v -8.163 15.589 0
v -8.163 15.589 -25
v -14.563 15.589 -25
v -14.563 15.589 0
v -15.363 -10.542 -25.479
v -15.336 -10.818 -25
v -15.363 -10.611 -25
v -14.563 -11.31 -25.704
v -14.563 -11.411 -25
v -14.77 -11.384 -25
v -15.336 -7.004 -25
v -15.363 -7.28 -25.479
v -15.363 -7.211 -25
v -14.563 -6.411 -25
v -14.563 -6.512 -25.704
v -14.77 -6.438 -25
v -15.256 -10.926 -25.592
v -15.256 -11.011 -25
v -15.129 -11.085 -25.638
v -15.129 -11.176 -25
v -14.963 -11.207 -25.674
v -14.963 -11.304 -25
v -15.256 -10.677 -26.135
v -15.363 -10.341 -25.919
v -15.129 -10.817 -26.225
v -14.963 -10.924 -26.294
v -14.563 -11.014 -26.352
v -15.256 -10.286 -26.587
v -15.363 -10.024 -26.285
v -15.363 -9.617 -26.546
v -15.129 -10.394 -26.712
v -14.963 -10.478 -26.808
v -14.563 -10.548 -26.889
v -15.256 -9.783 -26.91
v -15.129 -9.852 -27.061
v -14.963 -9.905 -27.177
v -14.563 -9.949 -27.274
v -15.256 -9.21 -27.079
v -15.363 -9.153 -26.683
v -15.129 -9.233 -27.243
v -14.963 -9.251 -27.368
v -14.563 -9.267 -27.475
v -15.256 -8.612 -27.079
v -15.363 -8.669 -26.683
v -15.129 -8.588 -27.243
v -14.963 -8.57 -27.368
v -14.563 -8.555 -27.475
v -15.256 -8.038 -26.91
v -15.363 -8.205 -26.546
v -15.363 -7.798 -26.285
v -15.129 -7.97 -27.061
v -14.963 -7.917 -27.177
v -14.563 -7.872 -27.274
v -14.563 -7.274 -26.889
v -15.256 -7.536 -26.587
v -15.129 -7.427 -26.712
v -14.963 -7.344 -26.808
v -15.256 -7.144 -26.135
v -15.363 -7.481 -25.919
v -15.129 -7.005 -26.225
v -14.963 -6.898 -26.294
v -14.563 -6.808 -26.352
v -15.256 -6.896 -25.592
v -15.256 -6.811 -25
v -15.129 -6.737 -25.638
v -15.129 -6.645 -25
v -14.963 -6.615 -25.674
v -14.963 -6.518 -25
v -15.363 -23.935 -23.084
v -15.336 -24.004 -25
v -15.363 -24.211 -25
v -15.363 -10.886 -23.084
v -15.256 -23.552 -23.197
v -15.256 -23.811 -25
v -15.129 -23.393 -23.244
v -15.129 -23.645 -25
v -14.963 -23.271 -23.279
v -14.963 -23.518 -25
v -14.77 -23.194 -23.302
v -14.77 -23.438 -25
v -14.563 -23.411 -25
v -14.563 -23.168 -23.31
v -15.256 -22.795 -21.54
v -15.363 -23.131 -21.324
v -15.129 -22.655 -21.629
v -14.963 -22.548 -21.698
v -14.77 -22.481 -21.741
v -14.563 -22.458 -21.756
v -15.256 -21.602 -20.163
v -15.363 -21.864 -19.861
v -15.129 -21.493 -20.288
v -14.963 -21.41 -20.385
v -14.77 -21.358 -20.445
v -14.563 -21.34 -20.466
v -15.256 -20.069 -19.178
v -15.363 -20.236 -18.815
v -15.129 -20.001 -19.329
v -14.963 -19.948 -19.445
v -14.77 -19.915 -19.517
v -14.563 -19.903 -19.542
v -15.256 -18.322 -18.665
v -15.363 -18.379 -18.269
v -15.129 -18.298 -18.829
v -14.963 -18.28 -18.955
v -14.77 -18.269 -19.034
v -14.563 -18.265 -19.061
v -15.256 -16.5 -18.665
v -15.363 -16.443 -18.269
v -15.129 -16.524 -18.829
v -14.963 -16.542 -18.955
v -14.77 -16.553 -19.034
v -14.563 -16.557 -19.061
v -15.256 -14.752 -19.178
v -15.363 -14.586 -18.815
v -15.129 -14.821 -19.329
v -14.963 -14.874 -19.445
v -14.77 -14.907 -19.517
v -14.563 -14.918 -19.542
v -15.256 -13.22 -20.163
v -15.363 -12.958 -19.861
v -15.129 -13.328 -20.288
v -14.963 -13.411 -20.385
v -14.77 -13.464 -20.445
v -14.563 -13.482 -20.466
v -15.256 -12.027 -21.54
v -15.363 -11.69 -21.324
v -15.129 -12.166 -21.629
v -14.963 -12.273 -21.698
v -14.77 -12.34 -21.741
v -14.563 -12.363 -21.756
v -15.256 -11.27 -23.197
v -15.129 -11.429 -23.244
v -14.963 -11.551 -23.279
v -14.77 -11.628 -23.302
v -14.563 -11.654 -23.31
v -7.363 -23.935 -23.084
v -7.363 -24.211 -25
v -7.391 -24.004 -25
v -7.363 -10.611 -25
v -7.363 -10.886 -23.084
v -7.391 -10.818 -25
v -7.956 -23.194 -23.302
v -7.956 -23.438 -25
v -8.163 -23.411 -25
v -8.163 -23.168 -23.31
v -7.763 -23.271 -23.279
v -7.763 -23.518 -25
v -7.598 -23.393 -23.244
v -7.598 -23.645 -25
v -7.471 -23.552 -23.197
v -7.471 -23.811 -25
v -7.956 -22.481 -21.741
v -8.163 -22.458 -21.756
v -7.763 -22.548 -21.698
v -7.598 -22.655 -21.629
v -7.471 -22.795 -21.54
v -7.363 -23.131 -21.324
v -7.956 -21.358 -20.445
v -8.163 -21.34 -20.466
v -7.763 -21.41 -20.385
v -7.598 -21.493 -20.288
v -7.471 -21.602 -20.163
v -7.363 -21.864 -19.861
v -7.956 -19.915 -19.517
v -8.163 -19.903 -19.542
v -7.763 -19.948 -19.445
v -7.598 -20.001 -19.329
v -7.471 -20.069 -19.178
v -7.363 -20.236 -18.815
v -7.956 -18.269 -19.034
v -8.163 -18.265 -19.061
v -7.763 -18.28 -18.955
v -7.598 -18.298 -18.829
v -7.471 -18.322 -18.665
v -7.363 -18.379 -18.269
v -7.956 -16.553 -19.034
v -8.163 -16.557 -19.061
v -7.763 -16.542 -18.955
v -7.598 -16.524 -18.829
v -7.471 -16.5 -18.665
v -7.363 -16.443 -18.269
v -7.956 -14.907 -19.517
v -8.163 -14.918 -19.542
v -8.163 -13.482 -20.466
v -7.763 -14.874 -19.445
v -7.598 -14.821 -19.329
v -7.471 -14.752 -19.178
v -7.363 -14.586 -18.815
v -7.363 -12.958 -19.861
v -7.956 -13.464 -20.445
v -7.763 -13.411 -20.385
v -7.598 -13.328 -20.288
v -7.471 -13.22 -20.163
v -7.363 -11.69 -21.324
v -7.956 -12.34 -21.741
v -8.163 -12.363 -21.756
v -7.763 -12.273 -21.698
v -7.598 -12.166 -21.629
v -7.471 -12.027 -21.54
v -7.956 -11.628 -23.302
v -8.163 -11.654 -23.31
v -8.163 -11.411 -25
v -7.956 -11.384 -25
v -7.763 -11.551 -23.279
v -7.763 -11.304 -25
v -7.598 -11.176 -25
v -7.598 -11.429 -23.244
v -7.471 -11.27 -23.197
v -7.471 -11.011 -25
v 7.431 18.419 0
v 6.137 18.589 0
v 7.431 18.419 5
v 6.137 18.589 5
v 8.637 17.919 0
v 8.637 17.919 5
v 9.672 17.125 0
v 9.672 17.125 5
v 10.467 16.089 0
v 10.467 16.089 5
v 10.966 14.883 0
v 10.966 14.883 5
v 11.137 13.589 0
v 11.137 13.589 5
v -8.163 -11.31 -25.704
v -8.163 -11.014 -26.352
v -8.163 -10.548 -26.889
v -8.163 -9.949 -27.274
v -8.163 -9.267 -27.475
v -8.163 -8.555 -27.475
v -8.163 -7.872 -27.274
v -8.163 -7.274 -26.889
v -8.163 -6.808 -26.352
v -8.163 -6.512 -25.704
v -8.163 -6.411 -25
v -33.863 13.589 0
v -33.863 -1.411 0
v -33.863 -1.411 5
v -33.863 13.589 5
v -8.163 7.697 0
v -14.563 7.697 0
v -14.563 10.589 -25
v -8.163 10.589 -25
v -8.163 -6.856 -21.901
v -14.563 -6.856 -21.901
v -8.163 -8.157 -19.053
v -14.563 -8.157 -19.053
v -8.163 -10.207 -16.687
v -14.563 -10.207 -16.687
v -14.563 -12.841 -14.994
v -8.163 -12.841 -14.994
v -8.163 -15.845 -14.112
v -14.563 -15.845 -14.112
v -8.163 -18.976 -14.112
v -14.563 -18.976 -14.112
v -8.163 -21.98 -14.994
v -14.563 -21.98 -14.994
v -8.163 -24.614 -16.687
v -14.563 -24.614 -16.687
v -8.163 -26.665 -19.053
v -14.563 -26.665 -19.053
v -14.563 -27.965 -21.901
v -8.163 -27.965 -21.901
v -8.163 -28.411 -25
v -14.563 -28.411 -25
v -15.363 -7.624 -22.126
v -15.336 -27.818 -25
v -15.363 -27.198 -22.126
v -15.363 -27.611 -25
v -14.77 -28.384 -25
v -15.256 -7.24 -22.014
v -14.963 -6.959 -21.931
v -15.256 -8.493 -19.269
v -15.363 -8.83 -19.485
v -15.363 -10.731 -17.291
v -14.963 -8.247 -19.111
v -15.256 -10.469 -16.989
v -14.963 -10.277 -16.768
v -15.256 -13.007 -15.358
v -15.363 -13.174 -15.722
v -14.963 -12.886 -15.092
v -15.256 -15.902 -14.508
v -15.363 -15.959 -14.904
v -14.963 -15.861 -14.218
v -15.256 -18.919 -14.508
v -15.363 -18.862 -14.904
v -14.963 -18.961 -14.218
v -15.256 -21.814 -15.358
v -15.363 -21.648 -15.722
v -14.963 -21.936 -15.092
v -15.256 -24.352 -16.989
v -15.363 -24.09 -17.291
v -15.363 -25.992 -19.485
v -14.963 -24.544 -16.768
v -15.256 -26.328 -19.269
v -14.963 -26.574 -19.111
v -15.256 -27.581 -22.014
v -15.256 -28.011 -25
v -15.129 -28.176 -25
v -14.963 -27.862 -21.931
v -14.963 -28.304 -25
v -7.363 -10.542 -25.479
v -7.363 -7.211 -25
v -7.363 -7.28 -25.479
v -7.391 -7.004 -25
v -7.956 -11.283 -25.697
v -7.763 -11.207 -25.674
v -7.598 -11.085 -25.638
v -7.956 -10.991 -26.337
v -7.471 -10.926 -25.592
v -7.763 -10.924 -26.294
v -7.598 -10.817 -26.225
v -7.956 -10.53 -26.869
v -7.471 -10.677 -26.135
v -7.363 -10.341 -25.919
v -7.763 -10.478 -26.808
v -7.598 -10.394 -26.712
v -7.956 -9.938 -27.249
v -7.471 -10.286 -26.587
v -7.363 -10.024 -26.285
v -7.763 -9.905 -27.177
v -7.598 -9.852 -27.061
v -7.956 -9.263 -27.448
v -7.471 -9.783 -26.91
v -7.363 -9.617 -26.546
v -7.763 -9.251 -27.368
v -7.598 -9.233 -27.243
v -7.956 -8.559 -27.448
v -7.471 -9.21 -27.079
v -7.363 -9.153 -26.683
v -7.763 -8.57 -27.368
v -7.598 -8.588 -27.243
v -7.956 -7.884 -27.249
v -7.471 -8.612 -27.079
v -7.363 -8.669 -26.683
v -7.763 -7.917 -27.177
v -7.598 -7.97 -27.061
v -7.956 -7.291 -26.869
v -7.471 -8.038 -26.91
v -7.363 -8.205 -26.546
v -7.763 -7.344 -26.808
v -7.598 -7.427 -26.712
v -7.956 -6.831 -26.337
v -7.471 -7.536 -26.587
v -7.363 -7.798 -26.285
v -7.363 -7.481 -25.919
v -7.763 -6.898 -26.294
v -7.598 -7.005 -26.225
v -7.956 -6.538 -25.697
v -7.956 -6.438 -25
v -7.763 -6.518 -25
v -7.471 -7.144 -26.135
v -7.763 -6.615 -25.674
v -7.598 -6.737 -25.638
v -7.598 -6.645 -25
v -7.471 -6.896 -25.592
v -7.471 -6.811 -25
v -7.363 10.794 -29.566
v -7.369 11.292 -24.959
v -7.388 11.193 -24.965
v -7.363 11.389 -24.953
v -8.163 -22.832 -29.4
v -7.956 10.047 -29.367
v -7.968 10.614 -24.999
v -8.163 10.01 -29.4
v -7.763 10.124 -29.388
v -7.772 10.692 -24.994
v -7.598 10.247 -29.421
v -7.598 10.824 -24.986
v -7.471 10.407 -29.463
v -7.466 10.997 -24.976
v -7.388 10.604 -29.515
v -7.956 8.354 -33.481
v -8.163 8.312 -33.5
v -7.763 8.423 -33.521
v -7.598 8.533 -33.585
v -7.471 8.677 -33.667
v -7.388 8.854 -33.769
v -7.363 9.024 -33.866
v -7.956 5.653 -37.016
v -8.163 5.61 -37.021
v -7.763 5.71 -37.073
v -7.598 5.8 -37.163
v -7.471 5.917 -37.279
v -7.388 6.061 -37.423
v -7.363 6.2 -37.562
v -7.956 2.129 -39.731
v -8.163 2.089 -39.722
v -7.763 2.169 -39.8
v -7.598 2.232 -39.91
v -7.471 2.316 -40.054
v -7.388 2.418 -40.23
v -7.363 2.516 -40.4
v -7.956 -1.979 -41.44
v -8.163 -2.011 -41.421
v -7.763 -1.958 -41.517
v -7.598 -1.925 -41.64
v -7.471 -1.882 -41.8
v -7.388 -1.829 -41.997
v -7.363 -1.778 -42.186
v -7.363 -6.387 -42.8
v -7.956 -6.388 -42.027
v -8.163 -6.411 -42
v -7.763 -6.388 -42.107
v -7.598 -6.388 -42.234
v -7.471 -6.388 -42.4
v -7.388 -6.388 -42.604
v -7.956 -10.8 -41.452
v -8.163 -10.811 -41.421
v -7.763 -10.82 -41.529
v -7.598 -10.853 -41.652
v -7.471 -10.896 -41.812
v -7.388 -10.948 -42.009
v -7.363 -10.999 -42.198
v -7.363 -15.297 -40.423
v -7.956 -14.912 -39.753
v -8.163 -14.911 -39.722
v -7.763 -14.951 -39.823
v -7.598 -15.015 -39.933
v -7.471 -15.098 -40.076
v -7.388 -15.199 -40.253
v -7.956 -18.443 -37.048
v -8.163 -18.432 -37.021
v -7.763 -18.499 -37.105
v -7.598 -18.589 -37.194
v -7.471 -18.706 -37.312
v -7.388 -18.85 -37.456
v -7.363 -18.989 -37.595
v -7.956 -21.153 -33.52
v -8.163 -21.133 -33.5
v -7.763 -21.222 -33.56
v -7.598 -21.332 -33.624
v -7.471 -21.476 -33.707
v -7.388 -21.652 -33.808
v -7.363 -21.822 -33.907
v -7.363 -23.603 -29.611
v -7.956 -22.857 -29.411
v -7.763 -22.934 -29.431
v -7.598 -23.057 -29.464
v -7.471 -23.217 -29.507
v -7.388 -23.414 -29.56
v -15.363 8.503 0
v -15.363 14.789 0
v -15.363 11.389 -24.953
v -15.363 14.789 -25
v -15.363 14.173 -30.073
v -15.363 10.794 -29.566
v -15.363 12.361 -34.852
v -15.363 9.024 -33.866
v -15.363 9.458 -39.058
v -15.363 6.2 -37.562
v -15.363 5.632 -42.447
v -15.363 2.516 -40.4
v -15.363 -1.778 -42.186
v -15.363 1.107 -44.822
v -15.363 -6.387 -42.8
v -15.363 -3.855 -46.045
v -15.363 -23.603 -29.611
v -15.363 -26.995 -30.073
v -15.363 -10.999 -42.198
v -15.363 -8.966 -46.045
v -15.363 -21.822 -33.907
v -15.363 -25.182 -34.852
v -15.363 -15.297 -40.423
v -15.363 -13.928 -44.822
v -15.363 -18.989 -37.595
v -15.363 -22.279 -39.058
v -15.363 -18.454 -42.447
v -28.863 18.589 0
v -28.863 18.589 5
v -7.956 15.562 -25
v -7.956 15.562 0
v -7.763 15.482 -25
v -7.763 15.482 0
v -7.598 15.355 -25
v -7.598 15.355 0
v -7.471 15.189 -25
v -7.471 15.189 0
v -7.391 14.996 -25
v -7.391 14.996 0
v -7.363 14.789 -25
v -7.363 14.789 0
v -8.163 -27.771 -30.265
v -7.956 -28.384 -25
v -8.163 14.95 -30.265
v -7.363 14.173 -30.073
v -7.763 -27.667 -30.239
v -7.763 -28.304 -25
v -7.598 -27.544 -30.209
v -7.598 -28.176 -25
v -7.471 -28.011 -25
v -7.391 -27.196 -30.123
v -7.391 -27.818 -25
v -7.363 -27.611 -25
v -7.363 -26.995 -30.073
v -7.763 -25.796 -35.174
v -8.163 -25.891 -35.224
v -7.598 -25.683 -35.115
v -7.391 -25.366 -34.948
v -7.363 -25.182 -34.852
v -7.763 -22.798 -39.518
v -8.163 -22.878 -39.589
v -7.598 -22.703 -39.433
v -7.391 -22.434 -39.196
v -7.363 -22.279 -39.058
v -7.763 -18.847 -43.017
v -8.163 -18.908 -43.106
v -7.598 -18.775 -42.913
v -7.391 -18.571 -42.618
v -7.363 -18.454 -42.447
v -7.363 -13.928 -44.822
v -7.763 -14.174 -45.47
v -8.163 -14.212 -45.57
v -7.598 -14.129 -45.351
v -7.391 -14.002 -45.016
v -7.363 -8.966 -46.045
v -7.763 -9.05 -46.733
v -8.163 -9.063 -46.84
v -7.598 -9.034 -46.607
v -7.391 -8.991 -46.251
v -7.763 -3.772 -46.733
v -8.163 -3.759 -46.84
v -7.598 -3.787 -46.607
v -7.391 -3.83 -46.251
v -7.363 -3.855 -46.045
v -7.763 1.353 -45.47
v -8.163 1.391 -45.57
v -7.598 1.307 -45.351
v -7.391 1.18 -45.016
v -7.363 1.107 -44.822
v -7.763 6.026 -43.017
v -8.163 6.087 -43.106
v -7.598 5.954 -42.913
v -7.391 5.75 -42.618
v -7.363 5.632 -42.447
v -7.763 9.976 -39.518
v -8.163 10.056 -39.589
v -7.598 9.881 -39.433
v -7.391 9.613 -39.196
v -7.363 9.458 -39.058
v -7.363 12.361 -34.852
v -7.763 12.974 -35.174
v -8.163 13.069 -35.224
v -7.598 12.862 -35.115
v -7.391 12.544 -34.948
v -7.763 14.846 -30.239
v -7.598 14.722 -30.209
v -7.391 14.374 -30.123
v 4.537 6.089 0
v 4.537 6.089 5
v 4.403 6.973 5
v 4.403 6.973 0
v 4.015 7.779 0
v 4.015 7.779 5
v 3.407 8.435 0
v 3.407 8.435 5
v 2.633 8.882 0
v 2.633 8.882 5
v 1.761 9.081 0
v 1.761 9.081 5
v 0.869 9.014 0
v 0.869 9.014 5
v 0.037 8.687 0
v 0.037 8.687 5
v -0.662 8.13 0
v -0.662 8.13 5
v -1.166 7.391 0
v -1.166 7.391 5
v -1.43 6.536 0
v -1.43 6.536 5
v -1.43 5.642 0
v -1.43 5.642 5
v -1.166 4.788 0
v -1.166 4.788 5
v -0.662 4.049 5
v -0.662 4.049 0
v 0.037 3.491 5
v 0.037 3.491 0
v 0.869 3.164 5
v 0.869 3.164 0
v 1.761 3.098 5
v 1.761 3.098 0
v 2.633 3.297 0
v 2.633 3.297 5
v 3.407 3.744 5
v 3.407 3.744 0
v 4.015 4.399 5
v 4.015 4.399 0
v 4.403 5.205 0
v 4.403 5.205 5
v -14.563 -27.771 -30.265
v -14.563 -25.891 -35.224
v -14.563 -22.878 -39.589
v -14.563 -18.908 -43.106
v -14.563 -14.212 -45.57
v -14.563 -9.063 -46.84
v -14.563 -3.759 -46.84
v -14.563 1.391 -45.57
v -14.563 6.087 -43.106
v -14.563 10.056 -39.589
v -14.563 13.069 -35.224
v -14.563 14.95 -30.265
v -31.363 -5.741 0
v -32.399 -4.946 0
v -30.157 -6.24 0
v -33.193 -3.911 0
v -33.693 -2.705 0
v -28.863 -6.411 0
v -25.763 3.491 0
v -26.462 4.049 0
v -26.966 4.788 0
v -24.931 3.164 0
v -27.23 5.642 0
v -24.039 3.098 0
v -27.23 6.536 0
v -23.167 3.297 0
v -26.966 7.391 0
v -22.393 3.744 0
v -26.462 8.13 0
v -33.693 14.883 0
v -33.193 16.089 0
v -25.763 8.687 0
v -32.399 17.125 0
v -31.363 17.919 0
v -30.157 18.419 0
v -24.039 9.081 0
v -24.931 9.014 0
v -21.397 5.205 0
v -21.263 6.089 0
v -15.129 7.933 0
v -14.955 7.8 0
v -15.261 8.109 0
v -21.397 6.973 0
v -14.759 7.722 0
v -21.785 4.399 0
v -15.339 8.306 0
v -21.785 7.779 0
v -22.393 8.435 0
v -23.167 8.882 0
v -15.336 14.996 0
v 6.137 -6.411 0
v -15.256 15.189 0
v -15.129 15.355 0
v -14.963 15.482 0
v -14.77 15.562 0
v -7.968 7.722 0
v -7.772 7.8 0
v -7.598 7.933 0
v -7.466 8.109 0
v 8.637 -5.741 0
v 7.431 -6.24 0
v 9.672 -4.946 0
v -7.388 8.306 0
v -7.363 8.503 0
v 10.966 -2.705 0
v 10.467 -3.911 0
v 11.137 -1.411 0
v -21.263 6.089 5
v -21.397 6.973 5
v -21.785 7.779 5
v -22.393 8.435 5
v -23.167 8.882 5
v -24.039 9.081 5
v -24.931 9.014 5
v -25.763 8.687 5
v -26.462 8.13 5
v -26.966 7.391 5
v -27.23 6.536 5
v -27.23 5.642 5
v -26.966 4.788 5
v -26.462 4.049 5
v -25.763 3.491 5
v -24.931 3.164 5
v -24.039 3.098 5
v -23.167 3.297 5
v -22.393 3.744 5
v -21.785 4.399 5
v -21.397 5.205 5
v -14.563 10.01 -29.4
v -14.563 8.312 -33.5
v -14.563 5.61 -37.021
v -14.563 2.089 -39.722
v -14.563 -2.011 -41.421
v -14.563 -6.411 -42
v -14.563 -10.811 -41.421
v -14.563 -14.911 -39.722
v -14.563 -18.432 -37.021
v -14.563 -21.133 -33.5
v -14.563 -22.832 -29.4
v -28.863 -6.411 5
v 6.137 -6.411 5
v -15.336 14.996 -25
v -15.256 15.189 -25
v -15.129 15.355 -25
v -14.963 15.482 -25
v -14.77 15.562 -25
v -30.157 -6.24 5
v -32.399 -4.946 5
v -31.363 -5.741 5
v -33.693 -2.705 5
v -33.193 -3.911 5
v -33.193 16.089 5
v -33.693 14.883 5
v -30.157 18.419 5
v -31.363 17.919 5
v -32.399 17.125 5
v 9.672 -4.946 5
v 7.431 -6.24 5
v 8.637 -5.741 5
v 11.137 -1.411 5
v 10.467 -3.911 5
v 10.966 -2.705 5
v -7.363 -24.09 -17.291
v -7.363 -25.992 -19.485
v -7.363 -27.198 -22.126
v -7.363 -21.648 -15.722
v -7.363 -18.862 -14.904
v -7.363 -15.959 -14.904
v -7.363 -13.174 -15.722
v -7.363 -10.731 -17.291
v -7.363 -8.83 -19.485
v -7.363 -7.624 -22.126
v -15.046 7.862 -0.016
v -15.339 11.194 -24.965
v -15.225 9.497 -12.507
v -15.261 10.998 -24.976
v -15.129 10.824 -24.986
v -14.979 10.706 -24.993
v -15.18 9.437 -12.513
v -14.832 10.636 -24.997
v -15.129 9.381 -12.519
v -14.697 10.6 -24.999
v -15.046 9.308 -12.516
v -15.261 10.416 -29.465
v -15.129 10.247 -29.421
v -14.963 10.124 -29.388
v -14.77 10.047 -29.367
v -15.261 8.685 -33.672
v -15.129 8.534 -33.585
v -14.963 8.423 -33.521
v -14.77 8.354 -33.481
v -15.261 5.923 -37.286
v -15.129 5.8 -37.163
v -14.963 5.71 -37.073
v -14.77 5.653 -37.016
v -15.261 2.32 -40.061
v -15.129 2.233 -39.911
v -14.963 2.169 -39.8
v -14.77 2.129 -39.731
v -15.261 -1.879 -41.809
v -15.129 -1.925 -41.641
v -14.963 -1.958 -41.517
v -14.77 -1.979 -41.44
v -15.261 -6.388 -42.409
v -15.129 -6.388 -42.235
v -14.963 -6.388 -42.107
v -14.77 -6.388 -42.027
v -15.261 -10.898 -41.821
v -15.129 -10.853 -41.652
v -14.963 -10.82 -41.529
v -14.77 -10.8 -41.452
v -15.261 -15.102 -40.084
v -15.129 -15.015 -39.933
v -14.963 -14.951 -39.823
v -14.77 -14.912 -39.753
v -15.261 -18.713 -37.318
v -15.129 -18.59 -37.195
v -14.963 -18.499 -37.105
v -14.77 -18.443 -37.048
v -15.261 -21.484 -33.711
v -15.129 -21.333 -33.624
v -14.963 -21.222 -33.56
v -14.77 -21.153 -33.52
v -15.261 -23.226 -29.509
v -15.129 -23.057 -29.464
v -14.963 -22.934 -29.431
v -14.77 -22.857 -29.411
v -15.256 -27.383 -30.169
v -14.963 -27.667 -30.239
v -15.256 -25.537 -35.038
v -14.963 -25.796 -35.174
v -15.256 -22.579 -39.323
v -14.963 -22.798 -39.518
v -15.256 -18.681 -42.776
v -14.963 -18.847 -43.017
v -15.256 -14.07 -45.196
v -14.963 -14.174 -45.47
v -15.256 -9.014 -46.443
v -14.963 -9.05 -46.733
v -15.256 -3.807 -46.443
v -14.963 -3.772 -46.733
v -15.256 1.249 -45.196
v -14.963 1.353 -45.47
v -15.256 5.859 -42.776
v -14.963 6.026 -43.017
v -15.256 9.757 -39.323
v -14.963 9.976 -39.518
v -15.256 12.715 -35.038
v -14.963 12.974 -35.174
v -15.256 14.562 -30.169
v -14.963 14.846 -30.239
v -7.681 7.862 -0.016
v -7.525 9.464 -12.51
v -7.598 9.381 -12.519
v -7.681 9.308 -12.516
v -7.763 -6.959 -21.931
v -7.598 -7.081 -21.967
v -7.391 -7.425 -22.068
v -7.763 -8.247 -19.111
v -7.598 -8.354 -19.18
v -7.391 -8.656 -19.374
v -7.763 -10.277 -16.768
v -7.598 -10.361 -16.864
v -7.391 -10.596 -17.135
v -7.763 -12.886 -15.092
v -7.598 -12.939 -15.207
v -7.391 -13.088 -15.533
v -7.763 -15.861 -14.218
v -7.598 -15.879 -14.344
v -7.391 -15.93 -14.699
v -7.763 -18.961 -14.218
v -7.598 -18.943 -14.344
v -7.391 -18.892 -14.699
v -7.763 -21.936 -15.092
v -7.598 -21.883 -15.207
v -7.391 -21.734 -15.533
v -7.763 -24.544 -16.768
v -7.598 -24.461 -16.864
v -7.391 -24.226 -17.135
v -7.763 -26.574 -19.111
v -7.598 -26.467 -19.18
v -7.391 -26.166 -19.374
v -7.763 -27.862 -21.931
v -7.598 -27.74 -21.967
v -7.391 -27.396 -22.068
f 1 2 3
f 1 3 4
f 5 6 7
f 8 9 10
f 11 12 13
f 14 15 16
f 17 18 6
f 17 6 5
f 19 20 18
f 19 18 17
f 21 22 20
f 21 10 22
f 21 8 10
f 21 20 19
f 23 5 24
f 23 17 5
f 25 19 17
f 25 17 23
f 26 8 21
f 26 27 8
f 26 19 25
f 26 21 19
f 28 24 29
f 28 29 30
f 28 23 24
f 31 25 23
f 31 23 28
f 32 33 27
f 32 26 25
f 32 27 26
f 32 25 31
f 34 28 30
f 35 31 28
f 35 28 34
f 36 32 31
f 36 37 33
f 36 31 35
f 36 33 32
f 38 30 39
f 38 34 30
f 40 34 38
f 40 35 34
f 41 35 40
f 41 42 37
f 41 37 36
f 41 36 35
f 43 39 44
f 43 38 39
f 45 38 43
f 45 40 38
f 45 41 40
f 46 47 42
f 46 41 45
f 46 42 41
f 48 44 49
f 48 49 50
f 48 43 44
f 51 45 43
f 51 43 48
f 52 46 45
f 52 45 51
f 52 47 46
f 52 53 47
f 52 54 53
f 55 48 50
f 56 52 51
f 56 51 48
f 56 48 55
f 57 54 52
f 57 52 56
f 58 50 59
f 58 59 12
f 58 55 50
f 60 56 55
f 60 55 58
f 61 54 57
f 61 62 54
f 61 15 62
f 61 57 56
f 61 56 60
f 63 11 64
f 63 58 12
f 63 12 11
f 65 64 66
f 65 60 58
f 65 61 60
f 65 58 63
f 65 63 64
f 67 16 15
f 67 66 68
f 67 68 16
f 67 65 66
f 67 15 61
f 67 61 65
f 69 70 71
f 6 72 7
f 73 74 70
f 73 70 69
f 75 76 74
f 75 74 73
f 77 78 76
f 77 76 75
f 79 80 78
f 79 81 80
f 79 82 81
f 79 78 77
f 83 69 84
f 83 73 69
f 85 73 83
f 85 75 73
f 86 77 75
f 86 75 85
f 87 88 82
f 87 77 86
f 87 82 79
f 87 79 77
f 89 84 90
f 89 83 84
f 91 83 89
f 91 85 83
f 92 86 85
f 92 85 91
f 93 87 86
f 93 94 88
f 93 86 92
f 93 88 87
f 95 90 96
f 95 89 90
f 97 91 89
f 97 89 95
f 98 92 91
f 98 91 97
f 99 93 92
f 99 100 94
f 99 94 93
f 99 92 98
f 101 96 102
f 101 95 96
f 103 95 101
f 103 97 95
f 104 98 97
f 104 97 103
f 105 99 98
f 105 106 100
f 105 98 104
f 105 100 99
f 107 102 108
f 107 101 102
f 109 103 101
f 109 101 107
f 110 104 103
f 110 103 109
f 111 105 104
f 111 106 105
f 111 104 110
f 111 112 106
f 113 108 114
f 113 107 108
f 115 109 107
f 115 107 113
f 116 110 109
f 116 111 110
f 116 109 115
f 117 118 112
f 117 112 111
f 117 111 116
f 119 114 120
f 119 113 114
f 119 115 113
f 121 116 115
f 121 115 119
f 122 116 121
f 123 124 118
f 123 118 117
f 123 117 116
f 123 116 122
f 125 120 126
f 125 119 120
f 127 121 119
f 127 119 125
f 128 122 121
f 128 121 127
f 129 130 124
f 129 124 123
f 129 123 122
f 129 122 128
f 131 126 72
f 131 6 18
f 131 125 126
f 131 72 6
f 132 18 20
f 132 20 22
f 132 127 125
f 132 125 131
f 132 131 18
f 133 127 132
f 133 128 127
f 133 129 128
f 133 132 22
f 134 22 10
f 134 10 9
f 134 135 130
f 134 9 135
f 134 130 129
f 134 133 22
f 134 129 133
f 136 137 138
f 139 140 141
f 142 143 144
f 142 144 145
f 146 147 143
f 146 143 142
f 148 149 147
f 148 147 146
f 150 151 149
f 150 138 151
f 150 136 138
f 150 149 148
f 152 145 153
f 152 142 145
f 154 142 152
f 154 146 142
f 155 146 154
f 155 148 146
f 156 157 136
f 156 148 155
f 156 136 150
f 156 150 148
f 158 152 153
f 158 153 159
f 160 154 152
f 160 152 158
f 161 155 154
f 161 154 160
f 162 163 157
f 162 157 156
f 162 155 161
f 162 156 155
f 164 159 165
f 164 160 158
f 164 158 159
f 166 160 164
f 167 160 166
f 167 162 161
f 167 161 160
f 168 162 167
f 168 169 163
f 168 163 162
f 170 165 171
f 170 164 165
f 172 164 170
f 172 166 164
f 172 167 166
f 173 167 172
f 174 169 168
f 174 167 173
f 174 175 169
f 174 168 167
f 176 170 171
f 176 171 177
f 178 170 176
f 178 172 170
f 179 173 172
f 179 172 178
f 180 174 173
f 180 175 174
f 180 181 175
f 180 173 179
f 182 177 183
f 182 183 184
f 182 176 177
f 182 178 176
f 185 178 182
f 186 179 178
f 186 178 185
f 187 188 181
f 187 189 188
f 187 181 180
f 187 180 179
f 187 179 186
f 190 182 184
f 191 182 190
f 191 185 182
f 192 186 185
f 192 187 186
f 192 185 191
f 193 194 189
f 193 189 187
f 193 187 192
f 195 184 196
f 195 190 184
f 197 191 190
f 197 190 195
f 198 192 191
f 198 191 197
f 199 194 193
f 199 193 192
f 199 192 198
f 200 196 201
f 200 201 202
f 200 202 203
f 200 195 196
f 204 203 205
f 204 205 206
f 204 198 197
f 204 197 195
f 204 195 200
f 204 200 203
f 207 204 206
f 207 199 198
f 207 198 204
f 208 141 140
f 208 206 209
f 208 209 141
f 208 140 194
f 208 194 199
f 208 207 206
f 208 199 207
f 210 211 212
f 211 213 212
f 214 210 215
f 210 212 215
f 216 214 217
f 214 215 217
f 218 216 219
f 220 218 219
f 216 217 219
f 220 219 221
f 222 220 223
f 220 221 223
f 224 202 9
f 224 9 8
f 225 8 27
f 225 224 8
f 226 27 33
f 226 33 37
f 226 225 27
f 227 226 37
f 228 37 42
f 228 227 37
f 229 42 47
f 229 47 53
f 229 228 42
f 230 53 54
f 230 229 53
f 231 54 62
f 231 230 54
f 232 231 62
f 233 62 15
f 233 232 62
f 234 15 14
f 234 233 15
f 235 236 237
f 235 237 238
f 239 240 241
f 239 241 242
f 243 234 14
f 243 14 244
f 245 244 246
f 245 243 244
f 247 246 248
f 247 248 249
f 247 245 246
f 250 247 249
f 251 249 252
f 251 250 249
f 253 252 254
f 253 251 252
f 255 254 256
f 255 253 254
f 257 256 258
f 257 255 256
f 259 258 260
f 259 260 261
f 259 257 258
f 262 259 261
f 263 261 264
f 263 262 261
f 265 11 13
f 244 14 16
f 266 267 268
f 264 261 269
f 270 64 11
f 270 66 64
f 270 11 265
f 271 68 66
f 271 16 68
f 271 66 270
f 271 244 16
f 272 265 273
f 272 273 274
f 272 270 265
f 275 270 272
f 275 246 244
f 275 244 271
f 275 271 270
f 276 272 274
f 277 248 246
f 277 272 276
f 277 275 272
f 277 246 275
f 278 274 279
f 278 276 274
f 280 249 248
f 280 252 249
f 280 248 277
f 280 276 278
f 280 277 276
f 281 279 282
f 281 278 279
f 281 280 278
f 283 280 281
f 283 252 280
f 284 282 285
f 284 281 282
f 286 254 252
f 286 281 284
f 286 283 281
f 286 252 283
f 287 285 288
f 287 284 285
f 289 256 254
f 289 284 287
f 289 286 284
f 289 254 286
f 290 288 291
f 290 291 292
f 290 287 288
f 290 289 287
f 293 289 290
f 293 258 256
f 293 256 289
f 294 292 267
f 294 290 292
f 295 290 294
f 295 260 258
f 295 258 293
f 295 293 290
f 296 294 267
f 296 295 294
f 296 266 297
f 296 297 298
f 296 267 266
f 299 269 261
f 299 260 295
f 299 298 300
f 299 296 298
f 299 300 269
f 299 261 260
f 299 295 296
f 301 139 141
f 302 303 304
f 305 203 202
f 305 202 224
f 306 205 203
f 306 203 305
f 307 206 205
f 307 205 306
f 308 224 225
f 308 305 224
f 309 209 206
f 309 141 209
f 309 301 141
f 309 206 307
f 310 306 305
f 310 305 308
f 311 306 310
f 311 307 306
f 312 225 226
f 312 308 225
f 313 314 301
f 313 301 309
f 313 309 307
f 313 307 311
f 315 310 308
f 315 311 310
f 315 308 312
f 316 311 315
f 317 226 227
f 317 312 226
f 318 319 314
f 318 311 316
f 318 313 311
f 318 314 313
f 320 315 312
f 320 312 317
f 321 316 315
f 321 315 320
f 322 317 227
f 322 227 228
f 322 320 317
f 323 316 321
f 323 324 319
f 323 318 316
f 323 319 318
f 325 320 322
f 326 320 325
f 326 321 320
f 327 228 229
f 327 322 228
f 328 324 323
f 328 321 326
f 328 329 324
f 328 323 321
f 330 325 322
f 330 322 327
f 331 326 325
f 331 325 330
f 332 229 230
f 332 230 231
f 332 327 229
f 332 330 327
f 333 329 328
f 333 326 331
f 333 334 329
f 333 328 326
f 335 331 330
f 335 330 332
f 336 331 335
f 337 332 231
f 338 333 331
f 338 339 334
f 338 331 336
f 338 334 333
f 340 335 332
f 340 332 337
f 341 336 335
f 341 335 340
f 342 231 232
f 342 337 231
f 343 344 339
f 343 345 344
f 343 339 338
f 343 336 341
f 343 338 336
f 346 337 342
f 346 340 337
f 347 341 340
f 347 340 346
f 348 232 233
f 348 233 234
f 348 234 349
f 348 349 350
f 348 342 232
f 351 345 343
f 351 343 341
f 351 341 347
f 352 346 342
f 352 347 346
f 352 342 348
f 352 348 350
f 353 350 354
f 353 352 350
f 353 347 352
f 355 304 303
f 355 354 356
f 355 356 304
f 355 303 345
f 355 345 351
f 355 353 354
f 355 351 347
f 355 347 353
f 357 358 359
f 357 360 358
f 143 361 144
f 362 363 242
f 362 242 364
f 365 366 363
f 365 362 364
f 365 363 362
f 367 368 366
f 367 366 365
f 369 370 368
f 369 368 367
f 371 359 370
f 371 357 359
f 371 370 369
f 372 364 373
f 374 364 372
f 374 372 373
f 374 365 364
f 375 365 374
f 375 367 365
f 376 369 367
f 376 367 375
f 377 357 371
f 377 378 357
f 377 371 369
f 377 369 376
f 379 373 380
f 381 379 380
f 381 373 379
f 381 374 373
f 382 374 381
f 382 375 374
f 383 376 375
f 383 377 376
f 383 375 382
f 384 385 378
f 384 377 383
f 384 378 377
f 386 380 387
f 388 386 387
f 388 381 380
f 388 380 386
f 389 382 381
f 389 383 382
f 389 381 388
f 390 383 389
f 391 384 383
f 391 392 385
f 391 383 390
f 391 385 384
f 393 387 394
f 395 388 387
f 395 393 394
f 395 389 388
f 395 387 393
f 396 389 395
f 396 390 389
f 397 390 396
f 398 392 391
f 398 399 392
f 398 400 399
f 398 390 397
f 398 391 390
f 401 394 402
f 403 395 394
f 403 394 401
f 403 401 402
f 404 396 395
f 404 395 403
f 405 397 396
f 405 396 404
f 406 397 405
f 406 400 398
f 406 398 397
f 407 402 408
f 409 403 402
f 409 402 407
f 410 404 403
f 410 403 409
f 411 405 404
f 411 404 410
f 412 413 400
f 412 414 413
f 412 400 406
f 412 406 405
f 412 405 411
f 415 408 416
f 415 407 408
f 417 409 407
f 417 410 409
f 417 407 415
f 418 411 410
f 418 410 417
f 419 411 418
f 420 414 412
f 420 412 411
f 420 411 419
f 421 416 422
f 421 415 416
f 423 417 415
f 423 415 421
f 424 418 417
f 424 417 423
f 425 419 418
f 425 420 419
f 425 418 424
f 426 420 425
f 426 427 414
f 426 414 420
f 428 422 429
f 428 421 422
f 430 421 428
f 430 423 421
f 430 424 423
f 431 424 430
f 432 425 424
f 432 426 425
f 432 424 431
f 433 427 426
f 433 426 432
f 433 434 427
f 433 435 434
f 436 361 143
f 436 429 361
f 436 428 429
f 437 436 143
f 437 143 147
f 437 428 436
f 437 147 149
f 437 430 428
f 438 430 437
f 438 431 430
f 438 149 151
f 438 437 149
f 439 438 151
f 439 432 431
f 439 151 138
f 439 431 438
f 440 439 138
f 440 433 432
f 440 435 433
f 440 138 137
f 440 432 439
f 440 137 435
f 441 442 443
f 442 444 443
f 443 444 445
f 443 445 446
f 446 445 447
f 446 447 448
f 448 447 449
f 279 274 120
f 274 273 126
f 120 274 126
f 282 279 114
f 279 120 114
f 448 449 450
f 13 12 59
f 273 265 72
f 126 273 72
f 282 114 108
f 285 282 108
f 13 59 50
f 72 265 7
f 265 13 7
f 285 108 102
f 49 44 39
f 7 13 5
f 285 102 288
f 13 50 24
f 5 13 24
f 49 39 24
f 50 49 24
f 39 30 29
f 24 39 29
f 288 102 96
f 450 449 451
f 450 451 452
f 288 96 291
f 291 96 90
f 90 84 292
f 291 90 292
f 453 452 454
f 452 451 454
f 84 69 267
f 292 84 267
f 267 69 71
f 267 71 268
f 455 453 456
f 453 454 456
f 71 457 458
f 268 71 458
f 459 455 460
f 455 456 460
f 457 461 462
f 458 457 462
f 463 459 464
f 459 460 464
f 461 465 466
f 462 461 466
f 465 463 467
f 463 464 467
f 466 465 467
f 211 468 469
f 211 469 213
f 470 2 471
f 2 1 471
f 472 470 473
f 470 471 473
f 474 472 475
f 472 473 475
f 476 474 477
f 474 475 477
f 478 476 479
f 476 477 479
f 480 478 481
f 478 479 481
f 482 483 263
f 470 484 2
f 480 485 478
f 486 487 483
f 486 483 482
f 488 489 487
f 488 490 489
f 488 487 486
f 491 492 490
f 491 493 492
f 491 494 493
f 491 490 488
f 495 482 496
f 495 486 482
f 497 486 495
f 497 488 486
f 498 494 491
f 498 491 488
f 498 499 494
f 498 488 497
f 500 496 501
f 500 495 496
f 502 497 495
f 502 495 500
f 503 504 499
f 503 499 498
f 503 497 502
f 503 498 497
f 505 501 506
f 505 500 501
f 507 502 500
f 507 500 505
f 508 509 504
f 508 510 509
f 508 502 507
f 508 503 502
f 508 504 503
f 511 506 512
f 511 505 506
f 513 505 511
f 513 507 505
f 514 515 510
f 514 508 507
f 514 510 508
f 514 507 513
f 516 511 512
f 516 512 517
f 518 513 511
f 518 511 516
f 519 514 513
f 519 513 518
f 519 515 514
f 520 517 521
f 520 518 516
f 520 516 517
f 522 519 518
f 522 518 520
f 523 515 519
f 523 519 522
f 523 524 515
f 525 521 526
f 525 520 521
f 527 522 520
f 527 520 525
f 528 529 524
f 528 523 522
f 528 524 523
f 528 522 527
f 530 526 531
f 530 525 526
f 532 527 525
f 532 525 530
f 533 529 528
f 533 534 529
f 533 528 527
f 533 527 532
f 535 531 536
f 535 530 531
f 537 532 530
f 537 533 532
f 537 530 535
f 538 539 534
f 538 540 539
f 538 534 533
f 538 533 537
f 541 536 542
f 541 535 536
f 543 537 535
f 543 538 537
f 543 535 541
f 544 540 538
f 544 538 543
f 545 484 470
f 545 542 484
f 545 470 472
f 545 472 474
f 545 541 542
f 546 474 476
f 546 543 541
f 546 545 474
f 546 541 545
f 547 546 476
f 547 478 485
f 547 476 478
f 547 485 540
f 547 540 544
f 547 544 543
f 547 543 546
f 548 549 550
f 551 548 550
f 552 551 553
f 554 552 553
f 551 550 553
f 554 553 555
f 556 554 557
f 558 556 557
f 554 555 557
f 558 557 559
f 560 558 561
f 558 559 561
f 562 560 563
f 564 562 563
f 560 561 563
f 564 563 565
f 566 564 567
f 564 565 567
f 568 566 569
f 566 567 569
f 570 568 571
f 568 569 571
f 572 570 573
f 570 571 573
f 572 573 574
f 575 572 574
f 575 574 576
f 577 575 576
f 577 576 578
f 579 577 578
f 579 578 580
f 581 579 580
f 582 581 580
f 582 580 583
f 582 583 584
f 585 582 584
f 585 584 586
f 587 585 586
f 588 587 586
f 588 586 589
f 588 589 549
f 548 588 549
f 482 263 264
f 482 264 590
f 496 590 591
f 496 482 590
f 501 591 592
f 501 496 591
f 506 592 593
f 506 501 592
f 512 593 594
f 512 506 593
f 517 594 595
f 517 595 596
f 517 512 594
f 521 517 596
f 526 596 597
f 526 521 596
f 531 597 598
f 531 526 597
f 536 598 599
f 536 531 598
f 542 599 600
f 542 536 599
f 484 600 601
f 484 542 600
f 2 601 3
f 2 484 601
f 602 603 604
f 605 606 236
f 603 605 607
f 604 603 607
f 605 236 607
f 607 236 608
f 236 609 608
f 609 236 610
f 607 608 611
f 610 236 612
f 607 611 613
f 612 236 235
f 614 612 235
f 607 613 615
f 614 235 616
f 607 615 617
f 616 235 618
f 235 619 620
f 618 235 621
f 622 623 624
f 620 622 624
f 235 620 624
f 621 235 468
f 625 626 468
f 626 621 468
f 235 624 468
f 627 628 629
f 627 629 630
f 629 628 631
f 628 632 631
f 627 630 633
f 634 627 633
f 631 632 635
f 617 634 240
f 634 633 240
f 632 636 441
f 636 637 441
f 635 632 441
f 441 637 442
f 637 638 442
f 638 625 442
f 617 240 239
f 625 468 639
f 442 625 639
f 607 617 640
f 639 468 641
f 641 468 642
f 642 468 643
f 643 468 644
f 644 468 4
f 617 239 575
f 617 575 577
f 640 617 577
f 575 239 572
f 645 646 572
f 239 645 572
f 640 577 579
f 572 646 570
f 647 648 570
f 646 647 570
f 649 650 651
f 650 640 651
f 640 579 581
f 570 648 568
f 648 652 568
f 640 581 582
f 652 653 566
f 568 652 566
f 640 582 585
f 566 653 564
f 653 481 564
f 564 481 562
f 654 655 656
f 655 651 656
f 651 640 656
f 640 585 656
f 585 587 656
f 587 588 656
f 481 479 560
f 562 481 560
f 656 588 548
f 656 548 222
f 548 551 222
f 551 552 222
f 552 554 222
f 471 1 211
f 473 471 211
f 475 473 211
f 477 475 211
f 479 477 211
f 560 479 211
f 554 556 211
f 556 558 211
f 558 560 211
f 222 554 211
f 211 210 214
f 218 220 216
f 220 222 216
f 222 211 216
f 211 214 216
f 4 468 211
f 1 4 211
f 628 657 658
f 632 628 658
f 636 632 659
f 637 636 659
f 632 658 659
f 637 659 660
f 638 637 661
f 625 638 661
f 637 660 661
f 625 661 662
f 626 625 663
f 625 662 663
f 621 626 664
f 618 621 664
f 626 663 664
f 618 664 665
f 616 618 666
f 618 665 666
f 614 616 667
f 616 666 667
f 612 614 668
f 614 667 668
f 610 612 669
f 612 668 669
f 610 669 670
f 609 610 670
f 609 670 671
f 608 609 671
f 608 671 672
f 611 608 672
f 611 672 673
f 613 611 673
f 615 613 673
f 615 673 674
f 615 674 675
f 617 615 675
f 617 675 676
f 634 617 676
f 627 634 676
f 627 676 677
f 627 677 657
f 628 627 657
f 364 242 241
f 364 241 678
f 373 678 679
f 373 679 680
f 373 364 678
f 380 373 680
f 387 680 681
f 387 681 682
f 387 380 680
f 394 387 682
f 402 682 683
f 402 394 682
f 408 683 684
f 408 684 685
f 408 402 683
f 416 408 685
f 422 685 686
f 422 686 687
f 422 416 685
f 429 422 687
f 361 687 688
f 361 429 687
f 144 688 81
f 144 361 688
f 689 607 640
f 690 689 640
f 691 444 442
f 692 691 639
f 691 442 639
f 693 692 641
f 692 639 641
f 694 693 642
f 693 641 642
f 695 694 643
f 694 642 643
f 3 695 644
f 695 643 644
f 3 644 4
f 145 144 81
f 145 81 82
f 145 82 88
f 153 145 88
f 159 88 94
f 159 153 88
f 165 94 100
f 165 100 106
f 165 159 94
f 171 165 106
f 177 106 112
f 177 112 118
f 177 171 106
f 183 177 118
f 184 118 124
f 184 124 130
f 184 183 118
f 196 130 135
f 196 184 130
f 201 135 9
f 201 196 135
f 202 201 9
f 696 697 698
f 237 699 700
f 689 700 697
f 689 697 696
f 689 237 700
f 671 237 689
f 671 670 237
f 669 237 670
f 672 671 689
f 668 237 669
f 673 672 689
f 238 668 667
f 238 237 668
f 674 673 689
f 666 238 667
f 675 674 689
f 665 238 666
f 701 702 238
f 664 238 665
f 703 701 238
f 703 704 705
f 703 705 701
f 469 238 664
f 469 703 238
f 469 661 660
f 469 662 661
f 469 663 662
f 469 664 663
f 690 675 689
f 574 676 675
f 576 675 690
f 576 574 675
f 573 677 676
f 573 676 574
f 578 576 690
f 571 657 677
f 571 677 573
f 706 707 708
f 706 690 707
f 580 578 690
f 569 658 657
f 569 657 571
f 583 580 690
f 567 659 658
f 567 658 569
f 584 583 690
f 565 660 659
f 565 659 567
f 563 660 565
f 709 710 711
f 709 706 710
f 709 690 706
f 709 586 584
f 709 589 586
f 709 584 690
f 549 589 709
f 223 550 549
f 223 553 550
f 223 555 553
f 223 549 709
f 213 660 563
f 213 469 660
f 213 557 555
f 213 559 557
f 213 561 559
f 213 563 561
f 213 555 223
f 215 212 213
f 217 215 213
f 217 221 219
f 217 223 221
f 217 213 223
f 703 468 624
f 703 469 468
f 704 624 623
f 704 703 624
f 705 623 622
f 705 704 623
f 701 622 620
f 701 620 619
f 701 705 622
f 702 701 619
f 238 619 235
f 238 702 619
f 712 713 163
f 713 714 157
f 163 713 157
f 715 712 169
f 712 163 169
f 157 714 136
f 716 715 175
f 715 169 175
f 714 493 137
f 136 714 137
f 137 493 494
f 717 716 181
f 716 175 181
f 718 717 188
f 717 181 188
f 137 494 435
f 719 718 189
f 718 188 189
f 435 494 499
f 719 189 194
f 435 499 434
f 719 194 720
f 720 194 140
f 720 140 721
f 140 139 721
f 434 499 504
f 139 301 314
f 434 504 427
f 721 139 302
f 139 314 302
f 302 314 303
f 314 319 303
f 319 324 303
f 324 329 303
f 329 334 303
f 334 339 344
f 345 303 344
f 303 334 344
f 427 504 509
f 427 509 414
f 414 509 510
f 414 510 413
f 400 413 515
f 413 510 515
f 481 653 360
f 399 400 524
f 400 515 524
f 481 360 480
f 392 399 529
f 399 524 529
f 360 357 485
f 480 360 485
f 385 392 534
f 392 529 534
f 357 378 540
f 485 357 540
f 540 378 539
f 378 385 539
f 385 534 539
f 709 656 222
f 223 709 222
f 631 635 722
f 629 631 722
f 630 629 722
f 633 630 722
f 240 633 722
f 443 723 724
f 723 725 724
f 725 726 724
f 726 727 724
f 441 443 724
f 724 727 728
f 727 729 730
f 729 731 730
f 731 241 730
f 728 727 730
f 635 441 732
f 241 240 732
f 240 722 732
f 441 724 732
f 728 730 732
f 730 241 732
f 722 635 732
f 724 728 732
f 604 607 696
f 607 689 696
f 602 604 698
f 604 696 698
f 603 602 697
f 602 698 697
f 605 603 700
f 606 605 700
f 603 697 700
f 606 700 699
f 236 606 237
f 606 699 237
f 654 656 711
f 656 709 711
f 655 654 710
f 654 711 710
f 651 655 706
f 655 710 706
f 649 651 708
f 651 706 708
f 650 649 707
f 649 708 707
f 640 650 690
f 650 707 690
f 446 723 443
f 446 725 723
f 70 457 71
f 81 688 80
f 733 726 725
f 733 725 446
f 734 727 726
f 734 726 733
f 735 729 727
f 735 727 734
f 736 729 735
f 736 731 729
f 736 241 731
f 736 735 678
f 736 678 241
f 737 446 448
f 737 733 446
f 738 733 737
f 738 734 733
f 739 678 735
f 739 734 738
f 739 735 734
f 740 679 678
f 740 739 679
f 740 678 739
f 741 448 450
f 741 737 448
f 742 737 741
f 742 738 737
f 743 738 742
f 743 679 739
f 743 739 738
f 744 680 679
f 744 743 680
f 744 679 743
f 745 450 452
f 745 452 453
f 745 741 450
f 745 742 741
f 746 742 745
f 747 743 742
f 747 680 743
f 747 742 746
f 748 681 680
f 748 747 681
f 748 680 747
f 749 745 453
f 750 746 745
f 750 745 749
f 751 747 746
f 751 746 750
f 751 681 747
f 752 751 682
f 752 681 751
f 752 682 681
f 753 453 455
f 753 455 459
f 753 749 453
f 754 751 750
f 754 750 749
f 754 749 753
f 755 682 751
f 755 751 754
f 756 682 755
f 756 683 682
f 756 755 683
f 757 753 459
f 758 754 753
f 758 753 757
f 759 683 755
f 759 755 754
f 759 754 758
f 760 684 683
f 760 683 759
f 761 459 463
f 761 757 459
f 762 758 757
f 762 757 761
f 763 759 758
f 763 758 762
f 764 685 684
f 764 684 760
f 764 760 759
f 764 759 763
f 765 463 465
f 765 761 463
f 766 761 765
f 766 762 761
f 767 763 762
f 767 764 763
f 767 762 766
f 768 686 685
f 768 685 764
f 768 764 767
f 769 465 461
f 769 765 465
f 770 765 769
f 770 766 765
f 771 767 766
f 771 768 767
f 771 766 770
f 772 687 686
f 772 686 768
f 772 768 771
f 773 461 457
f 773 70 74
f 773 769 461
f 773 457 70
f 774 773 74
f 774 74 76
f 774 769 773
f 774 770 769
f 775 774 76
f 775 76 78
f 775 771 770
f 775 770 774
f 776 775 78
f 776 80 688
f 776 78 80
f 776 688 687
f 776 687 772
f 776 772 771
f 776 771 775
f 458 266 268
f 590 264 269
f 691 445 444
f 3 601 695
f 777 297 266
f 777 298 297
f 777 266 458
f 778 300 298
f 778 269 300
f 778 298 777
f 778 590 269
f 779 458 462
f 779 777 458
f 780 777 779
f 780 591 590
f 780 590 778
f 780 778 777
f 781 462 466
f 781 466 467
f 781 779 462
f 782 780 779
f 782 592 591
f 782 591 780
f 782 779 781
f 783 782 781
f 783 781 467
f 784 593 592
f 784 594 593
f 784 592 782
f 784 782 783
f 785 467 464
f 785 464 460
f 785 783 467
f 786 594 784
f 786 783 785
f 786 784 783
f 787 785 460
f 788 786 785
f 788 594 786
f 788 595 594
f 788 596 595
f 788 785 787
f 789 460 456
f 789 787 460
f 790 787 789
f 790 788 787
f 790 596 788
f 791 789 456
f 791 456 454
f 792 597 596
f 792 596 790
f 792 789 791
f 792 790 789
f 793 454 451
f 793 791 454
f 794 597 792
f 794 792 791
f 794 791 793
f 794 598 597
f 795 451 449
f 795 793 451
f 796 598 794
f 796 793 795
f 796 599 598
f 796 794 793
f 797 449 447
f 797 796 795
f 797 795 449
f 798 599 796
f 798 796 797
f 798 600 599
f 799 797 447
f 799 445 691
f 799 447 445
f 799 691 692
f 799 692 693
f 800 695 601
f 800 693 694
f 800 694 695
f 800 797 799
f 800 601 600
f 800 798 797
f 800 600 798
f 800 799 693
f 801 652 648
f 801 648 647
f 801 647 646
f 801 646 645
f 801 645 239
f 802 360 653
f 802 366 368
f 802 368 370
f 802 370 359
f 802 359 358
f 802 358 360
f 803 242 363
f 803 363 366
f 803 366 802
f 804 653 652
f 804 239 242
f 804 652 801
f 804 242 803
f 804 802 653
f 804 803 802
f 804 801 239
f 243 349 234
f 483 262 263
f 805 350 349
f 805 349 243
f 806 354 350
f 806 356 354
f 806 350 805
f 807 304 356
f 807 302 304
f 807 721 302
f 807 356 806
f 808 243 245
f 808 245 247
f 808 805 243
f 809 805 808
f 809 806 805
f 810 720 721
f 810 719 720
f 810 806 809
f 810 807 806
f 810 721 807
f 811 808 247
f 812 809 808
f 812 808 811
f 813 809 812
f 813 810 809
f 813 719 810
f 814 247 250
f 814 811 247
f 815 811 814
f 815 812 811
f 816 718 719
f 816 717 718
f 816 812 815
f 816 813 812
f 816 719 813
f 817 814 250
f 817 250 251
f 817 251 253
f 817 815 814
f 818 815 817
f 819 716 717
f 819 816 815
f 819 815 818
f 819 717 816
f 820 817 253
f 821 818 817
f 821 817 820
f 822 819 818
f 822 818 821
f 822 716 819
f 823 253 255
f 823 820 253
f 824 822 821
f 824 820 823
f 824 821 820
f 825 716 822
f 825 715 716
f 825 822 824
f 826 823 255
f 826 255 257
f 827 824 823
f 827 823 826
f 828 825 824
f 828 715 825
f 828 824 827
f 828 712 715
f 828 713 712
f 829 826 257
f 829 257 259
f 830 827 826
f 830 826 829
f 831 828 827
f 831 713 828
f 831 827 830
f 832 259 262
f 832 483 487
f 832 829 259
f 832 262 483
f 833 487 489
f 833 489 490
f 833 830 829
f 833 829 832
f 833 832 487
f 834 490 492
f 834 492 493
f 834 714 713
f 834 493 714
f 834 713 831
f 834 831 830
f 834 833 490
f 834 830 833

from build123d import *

# Parameters (mm, degrees)
F0_W     = 45
F0_H     = 25
F1_DEPTH = 5
F2_R     = 3
F3_DEPTH = 25
F6_DEPTH = 4
F7_W     = 8
F7_H     = 7.8920384722
F9_W     = 8
F9_H     = 5
F11_R    = 5
F12_R    = 0.8


# Not quite as in the source:
# - ends of sketch curves that miss each other by under 0.0002 mm in the source are joined


with BuildPart() as f1:
    # F0 (on Top) → F1 (new body)
    with BuildSketch(Plane.XY):
        with Locations((-11.3633279689, 6.0892301559)):
            Rectangle(F0_W, F0_H)
    extrude(amount=F1_DEPTH)

    # F2 (on face) → F3 (cut)
    with BuildSketch(Plane.XY.offset(5)):
        with Locations((-24.2633279689, 6.0892301559)):
            Circle(F2_R)
        with Locations((1.5366720311, 6.0892301559)):
            Circle(F2_R)
    extrude(amount=-F3_DEPTH, mode=Mode.SUBTRACT)

    # F5 (on line) → F6 (join, symmetric)
    with BuildSketch(Plane.YZ.offset(-11.3633279689)):
        with BuildLine():
            Line((15.5892301559, -25), (15.5892301559, 0))
            Line((15.5892301559, 0), (10.5892301559, 0))
            Line((10.5892301559, 0), (10.5892301559, -25))
            ThreePointArc((10.5892301559, -25), (-6.4107698441, -42), (-23.4107698441, -25))
            ThreePointArc((-23.4107698441, -25), (-17.4107695142, -19.0000002749), (-11.4107697891, -25))
            ThreePointArc((-11.4107697891, -25), (-8.9107696516, -27.5), (-6.4107696516, -25))
            ThreePointArc((-6.4107696516, -25), (-17.4107695142, -14), (-28.4107695142, -25))
            ThreePointArc((-28.4107695142, -25), (-6.4107698441, -47), (15.5892301559, -25))
        make_face()
    extrude(amount=F6_DEPTH, both=True)

    # F7 (on face) → F10 section 0
    with BuildSketch(Plane.XY):
        with Locations((-11.3633279689, 11.6432109198)):
            Rectangle(F7_W, F7_H)
    # F9 (on face) → F10 section 1
    with BuildSketch(Plane.XY.offset(-25)):
        with Locations((-11.3633279689, 13.0892301559)):
            Rectangle(F9_W, F9_H)
    loft()

    # F11
    f11_edges = [f1.edges().sort_by_distance(p)[0] for p in [
        (-33.863328, 18.58923, 2.5),
        (-33.863328, -6.41077, 2.5),
        (11.136672, 18.58923, 2.5),
        (11.136672, -6.41077, 2.5),
    ]]
    fillet(f11_edges, radius=F11_R)

    # F12
    f12_edges = [f1.edges().sort_by_distance(p)[0] for p in [
        (-7.363328, 15.58923, -12.5),
        (-7.363328, -6.41077, -47),
        (-15.363328, 15.58923, -12.5),
        (-15.363328, -6.41077, -47),
        (-15.363328, 9.143211, -12.5),
        (-7.363328, 9.143211, -12.5),
    ]]
    fillet(f12_edges, radius=F12_R)


solid = f1.part
